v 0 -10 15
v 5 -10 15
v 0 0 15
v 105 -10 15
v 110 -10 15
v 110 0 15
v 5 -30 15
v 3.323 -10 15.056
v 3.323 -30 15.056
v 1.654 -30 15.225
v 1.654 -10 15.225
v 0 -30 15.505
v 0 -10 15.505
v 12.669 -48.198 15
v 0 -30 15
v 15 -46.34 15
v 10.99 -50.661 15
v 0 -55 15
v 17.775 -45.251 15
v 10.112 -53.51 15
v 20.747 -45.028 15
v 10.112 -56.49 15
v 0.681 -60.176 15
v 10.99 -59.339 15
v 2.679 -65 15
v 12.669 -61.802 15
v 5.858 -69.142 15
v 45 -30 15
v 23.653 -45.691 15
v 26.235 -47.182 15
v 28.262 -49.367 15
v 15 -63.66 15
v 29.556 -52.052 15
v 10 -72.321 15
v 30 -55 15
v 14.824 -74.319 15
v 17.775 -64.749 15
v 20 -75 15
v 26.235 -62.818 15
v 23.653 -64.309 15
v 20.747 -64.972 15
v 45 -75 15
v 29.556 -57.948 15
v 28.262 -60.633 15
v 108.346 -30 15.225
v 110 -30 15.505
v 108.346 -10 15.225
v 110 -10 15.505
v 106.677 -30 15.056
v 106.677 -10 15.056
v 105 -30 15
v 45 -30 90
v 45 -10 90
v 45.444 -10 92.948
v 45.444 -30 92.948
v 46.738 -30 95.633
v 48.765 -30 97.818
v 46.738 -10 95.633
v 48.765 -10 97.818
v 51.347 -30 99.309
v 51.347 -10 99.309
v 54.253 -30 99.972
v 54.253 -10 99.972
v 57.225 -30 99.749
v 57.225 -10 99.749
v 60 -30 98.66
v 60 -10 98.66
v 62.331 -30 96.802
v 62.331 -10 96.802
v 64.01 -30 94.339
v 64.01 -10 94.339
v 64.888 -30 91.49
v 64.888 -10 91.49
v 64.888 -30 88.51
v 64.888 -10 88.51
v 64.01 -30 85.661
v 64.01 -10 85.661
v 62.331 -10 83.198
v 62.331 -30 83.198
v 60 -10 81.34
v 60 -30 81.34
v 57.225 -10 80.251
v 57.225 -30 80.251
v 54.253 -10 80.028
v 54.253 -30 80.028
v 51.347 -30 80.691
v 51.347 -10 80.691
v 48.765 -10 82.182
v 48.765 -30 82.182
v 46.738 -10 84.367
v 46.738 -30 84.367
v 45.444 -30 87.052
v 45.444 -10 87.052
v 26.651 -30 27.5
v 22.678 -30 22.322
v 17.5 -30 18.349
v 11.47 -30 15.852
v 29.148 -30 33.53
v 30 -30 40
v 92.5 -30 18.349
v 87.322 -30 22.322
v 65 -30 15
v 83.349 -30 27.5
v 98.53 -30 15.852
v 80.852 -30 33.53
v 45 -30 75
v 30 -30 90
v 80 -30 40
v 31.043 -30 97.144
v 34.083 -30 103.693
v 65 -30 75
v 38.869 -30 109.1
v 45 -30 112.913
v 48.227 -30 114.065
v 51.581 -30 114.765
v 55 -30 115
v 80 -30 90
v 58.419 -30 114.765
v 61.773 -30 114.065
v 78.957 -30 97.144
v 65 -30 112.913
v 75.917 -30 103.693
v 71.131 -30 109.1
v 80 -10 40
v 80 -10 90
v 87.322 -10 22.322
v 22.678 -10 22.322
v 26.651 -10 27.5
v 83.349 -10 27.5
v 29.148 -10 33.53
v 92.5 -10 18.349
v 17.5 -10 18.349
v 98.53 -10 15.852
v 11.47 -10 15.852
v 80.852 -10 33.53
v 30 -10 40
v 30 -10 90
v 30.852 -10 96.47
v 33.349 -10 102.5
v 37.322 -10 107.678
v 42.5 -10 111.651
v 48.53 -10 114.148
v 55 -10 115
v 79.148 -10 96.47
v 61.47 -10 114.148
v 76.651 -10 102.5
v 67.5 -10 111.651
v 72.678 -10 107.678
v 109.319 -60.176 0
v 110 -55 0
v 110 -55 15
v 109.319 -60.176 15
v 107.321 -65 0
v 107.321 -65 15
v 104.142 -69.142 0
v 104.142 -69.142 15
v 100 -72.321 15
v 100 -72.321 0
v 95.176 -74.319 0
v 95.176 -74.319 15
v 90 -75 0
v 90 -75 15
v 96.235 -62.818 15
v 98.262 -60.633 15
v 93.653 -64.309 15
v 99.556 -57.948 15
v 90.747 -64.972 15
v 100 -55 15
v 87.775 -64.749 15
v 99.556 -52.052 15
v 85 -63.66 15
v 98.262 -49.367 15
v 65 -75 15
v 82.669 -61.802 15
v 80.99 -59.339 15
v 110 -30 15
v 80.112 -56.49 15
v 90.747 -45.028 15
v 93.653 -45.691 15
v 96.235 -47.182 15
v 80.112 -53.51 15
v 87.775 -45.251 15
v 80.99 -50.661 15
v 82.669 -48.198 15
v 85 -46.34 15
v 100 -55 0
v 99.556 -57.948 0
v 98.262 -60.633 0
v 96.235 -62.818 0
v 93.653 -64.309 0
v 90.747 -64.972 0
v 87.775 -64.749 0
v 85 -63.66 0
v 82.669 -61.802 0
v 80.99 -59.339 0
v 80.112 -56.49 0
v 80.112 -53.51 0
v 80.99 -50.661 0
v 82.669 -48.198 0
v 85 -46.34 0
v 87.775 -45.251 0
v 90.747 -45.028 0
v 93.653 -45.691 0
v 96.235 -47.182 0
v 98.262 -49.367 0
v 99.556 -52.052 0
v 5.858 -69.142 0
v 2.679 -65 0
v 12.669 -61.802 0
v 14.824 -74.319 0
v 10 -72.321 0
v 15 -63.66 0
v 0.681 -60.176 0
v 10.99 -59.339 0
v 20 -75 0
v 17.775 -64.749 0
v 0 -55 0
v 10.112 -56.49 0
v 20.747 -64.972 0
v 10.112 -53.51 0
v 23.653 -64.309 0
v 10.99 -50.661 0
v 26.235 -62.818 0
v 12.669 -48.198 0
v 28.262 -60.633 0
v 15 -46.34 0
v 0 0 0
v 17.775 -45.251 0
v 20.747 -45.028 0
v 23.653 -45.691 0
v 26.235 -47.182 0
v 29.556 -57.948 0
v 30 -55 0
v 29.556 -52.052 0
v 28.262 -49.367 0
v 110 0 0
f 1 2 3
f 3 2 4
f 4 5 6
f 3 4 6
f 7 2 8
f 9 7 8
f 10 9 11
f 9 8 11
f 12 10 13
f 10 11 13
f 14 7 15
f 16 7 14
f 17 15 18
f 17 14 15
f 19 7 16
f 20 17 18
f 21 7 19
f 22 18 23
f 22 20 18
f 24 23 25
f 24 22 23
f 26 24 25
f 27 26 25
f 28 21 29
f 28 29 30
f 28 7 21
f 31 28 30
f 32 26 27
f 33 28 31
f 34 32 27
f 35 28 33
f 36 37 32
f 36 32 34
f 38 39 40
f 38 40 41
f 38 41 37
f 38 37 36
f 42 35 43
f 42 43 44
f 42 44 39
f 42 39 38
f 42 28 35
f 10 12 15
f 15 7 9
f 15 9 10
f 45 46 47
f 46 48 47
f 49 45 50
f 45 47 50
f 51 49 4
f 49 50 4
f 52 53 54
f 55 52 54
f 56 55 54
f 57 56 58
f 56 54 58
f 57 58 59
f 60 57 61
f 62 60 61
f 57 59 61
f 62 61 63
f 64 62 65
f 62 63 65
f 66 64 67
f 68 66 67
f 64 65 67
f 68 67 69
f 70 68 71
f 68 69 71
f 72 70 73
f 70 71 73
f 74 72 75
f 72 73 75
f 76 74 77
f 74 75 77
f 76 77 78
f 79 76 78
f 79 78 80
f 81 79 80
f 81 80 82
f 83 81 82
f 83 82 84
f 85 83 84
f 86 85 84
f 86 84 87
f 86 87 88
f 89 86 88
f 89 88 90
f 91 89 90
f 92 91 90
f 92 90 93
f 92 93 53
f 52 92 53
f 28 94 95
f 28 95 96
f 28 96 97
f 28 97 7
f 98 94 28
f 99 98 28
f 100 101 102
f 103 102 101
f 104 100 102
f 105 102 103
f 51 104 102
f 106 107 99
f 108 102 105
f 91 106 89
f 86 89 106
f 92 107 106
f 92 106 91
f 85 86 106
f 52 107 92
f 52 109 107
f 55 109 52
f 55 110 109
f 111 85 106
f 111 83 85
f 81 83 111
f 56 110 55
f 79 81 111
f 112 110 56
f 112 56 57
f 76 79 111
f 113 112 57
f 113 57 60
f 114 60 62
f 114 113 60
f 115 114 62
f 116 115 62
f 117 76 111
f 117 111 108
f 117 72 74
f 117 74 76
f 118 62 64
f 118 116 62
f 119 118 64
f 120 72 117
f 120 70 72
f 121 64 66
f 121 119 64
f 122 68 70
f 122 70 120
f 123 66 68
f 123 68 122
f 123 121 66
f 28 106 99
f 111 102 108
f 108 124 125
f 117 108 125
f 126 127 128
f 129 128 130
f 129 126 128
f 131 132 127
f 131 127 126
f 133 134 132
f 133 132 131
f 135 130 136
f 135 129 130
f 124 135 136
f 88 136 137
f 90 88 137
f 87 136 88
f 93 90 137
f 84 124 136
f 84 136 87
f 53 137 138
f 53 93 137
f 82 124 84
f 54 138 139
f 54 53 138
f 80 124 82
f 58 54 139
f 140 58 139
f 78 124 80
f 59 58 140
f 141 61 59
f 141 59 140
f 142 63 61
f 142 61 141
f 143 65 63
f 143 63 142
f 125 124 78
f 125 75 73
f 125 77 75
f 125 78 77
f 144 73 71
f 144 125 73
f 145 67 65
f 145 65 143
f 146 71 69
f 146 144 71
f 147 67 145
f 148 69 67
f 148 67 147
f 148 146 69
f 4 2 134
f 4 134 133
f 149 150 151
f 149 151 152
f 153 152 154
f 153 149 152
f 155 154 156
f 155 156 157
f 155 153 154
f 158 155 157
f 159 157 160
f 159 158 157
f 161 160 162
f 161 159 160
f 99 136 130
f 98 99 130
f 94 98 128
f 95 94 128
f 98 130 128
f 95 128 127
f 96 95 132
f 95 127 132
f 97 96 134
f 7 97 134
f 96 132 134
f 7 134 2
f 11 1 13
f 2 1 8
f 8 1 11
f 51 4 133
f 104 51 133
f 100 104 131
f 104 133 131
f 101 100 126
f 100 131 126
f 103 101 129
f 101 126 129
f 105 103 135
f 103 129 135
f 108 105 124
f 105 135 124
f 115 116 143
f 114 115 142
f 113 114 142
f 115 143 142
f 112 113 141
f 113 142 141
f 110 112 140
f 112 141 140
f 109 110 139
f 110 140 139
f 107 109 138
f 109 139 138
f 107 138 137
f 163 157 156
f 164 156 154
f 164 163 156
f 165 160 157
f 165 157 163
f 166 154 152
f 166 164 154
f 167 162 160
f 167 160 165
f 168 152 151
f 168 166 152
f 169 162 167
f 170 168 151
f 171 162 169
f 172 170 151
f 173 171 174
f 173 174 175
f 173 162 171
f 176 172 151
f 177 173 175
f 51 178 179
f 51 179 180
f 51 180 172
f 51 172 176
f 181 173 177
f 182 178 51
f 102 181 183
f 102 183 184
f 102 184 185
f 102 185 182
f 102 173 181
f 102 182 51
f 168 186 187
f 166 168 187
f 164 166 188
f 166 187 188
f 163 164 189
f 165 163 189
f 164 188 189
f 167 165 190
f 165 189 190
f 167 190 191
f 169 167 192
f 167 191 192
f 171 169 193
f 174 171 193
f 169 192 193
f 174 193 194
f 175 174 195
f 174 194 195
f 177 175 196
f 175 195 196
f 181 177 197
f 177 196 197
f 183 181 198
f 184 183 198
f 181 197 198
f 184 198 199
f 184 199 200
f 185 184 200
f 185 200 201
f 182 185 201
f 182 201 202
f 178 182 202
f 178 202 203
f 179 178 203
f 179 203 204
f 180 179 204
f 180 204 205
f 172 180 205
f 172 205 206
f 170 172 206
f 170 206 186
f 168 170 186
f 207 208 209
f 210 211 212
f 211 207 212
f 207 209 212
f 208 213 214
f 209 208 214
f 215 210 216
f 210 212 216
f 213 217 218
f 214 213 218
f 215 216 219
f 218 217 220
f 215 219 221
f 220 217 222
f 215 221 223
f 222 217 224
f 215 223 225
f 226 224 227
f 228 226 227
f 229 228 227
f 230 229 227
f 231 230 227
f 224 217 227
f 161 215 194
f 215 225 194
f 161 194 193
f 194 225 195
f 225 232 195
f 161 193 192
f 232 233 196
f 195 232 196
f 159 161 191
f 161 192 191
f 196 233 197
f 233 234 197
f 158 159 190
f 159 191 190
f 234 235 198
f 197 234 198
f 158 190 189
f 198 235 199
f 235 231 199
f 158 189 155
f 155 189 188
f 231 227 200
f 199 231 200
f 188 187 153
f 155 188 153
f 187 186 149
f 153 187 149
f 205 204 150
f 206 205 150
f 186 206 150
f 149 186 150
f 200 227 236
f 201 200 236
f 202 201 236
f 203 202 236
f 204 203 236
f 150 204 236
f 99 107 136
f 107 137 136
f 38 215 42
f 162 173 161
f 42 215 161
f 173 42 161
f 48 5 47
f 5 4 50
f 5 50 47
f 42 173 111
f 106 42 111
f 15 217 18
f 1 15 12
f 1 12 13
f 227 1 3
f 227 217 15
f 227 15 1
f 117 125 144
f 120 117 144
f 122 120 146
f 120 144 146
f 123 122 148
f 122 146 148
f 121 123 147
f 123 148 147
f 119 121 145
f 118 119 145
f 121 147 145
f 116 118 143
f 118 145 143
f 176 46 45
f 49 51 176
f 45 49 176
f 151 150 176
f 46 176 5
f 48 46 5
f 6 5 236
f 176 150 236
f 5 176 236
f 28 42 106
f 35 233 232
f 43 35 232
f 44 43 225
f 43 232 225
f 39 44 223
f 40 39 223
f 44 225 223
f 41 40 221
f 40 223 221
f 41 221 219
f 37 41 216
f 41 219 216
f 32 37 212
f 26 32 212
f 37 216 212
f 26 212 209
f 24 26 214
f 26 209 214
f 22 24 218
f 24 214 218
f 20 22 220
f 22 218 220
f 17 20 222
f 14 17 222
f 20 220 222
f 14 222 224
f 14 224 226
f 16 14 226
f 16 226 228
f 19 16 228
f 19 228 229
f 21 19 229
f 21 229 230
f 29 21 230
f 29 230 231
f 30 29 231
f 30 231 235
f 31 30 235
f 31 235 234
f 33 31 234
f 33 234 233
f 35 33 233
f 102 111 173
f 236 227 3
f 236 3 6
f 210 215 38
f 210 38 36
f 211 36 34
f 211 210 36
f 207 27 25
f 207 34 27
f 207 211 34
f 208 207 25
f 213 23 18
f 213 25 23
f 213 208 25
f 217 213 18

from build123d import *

# Parameters (mm, degrees)
F0_W         = 110
F0_H         = 75
F1_DEPTH     = 115
F2_W         = 10
F2_H         = 100
F3_DEPTH     = 110.001
F4_R         = 10
F5_DEPTH     = 65.001
F6_R         = 10
F7_DEPTH     = 115.001
F9_DEPTH     = 45
F11_DEPTH    = 65.001
F12_T1_DEPTH = 115.5051025722
F12_T3_DEPTH = 115
F14_DEPTH    = 45.0010001
F16_DEPTH    = 45.0010001


# Not quite as in the source:
# - a fillet or chamfer that OpenCascade refuses, or shapes differently, is made with other operations: its cross-section is extruded or revolved along the edge and cut away or added


with BuildPart() as f1:
    # F0 (on Top) → F1 (new body)
    with BuildSketch(Plane.XY):
        with Locations((55, -37.5)):
            Rectangle(F0_W, F0_H)
    extrude(amount=F1_DEPTH)

    # F2 (on face) → F3 (cut, through all)
    with BuildSketch(Plane.YZ.offset(110)):
        with Locations((-5, 65)):
            Rectangle(F2_W, F2_H)
    extrude(amount=-F3_DEPTH, mode=Mode.SUBTRACT)

    # F4 (on face) → F5 (cut, through all)
    with BuildSketch(Plane(origin=(0, -10, 0), x_dir=(-1, 0, 0), z_dir=(0, 1, 0))):
        with BuildLine():
            ThreePointArc((-110, 64.4948974278), (-89.1886116992, 59.364916731), (-80, 40))
            Line((-80, 40), (-80, 90))
            Line((-80, 90), (-80, 115))
            Line((-80, 115), (-110, 115))
            Line((-110, 115), (-110, 64.4948974278))
        make_face()
        with BuildLine():
            ThreePointArc((-105, 15), (-87.3223304703, 22.3223304703), (-80, 40))
            ThreePointArc((-80, 40), (-89.1886116992, 59.364916731), (-110, 64.4948974278))
            Line((-110, 64.4948974278), (-110, 15.5051025722))
            ThreePointArc((-110, 15.5051025722), (-107.5127240501, 15.1265961749), (-105, 15))
        make_face()
        with BuildLine():
            ThreePointArc((0, 64.4948974278), (-20.8113883008, 59.364916731), (-30, 40))
            ThreePointArc((-30, 40), (-22.6776695035, 22.3223304441), (-4.9999999259, 15))
            ThreePointArc((-4.9999999259, 15), (-2.487275913, 15.1265961786), (0, 15.5051025722))
            Line((0, 15.5051025722), (0, 64.4948974278))
        make_face()
        with BuildLine():
            Line((-30, 90), (-30, 40))
            ThreePointArc((-30, 40), (-20.8113883008, 59.364916731), (0, 64.4948974278))
            Line((0, 64.4948974278), (0, 115))
            Line((0, 115), (-30, 115))
            Line((-30, 115), (-30, 90))
        make_face()
        with BuildLine():
            ThreePointArc((-55, 115), (-37.3223304703, 107.6776695297), (-30, 90))
            Line((-30, 90), (-30, 115))
            Line((-30, 115), (-55, 115))
        make_face()
        with BuildLine():
            Line((-80, 115), (-80, 90))
            ThreePointArc((-80, 90), (-72.6776695297, 107.6776695297), (-55, 115))
            Line((-55, 115), (-80, 115))
        make_face()
        with Locations((-55, 90)):
            Circle(F4_R)
    extrude(amount=-F5_DEPTH, mode=Mode.SUBTRACT)

    # F6 (on face) → F7 (cut, through all)
    with BuildSketch(Plane(origin=(0, 0, 0), x_dir=(1, 0, 0), z_dir=(0, 0, -1))):
        with Locations((90, 55)):
            Circle(F6_R)
        with Locations((20, 55)):
            Circle(F6_R)
    extrude(amount=-F7_DEPTH, mode=Mode.SUBTRACT)

    # F8 (on face) → F9 (cut)
    with BuildSketch(Plane.XZ.offset(75)):
        with BuildLine():
            Line((0, 115), (0, 15.5051025722))
            ThreePointArc((0, 15.5051025722), (2.4872759548, 15.1265961744), (5.00000001, 15))
            ThreePointArc((5.00000001, 15), (22.6776695332, 22.3223304739), (30, 40))
            Line((30, 40), (30, 90))
            ThreePointArc((30, 90), (34.0834993366, 103.6930639376), (45, 112.9128784748))
            Line((45, 112.9128784748), (45, 115))
            Line((45, 115), (0, 115))
        make_face()
        with BuildLine():
            ThreePointArc((30, 40), (22.6776695332, 22.3223304739), (5.00000001, 15))
            Line((5.00000001, 15), (45, 15))
            Line((45, 15), (45, 75))
            Line((45, 75), (45, 90))
            Line((45, 90), (45, 112.9128784748))
            ThreePointArc((45, 112.9128784748), (34.0834993366, 103.6930639376), (30, 90))
            Line((30, 90), (30, 40))
        make_face()
        with BuildLine():
            ThreePointArc((105.0000000223, 15), (107.5127240612, 15.126596176), (110, 15.5051025722))
            Line((110, 15.5051025722), (110, 115))
            Line((110, 115), (65, 115))
            Line((65, 115), (65, 112.9128784748))
            ThreePointArc((65, 112.9128784748), (75.9165006634, 103.6930639376), (80, 90))
            Line((80, 90), (80, 40))
            ThreePointArc((80, 40), (87.3223304782, 22.3223304625), (105.0000000223, 15))
        make_face()
        with BuildLine():
            Line((65, 15), (105.0000000223, 15))
            ThreePointArc((105.0000000223, 15), (87.3223304782, 22.3223304625), (80, 40))
            Line((80, 40), (80, 90))
            ThreePointArc((80, 90), (75.9165006634, 103.6930639376), (65, 112.9128784748))
            Line((65, 112.9128784748), (65, 90))
            Line((65, 90), (65, 75))
            Line((65, 75), (65, 15))
        make_face()
        with BuildLine():
            Line((45, 90), (45, 75))
            Line((45, 75), (65, 75))
            Line((65, 75), (65, 90))
            ThreePointArc((65, 90), (55, 80), (45, 90))
        make_face()
        with BuildLine():
            ThreePointArc((65, 112.9128784748), (60.1077410922, 114.4726578233), (55, 115))
            ThreePointArc((55, 115), (49.8922589078, 114.4726578233), (45, 112.9128784748))
            Line((45, 112.9128784748), (45, 90))
            ThreePointArc((45, 90), (55, 100), (65, 90))
            Line((65, 90), (65, 112.9128784748))
        make_face()
        with BuildLine():
            ThreePointArc((65, 90), (55, 100), (45, 90))
            ThreePointArc((45, 90), (55, 80), (65, 90))
        make_face()
    extrude(amount=-F9_DEPTH, mode=Mode.SUBTRACT)

    # F10 (on face) → F11 (cut, through all)
    with BuildSketch(Plane.YZ.offset(65)):
        Polygon((-75, 75), (-75, 15), (-30, 75), align=None)
    extrude(amount=-F11_DEPTH, mode=Mode.SUBTRACT)

    # F12: fillet of radius 20 on 2 edges, made by hand

    # F12_s2 → F12_t1 (cut)
    with BuildSketch(Plane.XY.offset(-50)):
        with BuildLine():
            ThreePointArc((110, -55), (104.1421356237, -69.1421356237), (90, -75))
            Line((90, -75), (110, -75))
            Line((110, -75), (110, -55))
        make_face()
    extrude(amount=F12_T1_DEPTH, mode=Mode.SUBTRACT)

    # F12_s4 → F12_t3 (cut)
    with BuildSketch(Plane.XY.offset(-50)):
        with BuildLine():
            ThreePointArc((20, -75), (5.8578643763, -69.1421356237), (0, -55))
            Line((0, -55), (0, -75))
            Line((0, -75), (20, -75))
        make_face()
    extrude(amount=F12_T3_DEPTH, mode=Mode.SUBTRACT)

    # F14 (cut, through all): a face of the model
    f14_faces = [f1.faces().sort_by_distance(p)[0] for p in [
        (65, -45, 35),
    ]]
    extrude(f14_faces, amount=F14_DEPTH, mode=Mode.SUBTRACT)

    # F15 (on face) → F16 (cut, through all)
    with BuildSketch(Plane(origin=(45, 0, 0), x_dir=(0, -1, 0), z_dir=(-1, 0, 0))):
        Polygon((30, 75), (30, 15), (75, 15), align=None)
    extrude(amount=F16_DEPTH, mode=Mode.SUBTRACT)


solid = f1.part
